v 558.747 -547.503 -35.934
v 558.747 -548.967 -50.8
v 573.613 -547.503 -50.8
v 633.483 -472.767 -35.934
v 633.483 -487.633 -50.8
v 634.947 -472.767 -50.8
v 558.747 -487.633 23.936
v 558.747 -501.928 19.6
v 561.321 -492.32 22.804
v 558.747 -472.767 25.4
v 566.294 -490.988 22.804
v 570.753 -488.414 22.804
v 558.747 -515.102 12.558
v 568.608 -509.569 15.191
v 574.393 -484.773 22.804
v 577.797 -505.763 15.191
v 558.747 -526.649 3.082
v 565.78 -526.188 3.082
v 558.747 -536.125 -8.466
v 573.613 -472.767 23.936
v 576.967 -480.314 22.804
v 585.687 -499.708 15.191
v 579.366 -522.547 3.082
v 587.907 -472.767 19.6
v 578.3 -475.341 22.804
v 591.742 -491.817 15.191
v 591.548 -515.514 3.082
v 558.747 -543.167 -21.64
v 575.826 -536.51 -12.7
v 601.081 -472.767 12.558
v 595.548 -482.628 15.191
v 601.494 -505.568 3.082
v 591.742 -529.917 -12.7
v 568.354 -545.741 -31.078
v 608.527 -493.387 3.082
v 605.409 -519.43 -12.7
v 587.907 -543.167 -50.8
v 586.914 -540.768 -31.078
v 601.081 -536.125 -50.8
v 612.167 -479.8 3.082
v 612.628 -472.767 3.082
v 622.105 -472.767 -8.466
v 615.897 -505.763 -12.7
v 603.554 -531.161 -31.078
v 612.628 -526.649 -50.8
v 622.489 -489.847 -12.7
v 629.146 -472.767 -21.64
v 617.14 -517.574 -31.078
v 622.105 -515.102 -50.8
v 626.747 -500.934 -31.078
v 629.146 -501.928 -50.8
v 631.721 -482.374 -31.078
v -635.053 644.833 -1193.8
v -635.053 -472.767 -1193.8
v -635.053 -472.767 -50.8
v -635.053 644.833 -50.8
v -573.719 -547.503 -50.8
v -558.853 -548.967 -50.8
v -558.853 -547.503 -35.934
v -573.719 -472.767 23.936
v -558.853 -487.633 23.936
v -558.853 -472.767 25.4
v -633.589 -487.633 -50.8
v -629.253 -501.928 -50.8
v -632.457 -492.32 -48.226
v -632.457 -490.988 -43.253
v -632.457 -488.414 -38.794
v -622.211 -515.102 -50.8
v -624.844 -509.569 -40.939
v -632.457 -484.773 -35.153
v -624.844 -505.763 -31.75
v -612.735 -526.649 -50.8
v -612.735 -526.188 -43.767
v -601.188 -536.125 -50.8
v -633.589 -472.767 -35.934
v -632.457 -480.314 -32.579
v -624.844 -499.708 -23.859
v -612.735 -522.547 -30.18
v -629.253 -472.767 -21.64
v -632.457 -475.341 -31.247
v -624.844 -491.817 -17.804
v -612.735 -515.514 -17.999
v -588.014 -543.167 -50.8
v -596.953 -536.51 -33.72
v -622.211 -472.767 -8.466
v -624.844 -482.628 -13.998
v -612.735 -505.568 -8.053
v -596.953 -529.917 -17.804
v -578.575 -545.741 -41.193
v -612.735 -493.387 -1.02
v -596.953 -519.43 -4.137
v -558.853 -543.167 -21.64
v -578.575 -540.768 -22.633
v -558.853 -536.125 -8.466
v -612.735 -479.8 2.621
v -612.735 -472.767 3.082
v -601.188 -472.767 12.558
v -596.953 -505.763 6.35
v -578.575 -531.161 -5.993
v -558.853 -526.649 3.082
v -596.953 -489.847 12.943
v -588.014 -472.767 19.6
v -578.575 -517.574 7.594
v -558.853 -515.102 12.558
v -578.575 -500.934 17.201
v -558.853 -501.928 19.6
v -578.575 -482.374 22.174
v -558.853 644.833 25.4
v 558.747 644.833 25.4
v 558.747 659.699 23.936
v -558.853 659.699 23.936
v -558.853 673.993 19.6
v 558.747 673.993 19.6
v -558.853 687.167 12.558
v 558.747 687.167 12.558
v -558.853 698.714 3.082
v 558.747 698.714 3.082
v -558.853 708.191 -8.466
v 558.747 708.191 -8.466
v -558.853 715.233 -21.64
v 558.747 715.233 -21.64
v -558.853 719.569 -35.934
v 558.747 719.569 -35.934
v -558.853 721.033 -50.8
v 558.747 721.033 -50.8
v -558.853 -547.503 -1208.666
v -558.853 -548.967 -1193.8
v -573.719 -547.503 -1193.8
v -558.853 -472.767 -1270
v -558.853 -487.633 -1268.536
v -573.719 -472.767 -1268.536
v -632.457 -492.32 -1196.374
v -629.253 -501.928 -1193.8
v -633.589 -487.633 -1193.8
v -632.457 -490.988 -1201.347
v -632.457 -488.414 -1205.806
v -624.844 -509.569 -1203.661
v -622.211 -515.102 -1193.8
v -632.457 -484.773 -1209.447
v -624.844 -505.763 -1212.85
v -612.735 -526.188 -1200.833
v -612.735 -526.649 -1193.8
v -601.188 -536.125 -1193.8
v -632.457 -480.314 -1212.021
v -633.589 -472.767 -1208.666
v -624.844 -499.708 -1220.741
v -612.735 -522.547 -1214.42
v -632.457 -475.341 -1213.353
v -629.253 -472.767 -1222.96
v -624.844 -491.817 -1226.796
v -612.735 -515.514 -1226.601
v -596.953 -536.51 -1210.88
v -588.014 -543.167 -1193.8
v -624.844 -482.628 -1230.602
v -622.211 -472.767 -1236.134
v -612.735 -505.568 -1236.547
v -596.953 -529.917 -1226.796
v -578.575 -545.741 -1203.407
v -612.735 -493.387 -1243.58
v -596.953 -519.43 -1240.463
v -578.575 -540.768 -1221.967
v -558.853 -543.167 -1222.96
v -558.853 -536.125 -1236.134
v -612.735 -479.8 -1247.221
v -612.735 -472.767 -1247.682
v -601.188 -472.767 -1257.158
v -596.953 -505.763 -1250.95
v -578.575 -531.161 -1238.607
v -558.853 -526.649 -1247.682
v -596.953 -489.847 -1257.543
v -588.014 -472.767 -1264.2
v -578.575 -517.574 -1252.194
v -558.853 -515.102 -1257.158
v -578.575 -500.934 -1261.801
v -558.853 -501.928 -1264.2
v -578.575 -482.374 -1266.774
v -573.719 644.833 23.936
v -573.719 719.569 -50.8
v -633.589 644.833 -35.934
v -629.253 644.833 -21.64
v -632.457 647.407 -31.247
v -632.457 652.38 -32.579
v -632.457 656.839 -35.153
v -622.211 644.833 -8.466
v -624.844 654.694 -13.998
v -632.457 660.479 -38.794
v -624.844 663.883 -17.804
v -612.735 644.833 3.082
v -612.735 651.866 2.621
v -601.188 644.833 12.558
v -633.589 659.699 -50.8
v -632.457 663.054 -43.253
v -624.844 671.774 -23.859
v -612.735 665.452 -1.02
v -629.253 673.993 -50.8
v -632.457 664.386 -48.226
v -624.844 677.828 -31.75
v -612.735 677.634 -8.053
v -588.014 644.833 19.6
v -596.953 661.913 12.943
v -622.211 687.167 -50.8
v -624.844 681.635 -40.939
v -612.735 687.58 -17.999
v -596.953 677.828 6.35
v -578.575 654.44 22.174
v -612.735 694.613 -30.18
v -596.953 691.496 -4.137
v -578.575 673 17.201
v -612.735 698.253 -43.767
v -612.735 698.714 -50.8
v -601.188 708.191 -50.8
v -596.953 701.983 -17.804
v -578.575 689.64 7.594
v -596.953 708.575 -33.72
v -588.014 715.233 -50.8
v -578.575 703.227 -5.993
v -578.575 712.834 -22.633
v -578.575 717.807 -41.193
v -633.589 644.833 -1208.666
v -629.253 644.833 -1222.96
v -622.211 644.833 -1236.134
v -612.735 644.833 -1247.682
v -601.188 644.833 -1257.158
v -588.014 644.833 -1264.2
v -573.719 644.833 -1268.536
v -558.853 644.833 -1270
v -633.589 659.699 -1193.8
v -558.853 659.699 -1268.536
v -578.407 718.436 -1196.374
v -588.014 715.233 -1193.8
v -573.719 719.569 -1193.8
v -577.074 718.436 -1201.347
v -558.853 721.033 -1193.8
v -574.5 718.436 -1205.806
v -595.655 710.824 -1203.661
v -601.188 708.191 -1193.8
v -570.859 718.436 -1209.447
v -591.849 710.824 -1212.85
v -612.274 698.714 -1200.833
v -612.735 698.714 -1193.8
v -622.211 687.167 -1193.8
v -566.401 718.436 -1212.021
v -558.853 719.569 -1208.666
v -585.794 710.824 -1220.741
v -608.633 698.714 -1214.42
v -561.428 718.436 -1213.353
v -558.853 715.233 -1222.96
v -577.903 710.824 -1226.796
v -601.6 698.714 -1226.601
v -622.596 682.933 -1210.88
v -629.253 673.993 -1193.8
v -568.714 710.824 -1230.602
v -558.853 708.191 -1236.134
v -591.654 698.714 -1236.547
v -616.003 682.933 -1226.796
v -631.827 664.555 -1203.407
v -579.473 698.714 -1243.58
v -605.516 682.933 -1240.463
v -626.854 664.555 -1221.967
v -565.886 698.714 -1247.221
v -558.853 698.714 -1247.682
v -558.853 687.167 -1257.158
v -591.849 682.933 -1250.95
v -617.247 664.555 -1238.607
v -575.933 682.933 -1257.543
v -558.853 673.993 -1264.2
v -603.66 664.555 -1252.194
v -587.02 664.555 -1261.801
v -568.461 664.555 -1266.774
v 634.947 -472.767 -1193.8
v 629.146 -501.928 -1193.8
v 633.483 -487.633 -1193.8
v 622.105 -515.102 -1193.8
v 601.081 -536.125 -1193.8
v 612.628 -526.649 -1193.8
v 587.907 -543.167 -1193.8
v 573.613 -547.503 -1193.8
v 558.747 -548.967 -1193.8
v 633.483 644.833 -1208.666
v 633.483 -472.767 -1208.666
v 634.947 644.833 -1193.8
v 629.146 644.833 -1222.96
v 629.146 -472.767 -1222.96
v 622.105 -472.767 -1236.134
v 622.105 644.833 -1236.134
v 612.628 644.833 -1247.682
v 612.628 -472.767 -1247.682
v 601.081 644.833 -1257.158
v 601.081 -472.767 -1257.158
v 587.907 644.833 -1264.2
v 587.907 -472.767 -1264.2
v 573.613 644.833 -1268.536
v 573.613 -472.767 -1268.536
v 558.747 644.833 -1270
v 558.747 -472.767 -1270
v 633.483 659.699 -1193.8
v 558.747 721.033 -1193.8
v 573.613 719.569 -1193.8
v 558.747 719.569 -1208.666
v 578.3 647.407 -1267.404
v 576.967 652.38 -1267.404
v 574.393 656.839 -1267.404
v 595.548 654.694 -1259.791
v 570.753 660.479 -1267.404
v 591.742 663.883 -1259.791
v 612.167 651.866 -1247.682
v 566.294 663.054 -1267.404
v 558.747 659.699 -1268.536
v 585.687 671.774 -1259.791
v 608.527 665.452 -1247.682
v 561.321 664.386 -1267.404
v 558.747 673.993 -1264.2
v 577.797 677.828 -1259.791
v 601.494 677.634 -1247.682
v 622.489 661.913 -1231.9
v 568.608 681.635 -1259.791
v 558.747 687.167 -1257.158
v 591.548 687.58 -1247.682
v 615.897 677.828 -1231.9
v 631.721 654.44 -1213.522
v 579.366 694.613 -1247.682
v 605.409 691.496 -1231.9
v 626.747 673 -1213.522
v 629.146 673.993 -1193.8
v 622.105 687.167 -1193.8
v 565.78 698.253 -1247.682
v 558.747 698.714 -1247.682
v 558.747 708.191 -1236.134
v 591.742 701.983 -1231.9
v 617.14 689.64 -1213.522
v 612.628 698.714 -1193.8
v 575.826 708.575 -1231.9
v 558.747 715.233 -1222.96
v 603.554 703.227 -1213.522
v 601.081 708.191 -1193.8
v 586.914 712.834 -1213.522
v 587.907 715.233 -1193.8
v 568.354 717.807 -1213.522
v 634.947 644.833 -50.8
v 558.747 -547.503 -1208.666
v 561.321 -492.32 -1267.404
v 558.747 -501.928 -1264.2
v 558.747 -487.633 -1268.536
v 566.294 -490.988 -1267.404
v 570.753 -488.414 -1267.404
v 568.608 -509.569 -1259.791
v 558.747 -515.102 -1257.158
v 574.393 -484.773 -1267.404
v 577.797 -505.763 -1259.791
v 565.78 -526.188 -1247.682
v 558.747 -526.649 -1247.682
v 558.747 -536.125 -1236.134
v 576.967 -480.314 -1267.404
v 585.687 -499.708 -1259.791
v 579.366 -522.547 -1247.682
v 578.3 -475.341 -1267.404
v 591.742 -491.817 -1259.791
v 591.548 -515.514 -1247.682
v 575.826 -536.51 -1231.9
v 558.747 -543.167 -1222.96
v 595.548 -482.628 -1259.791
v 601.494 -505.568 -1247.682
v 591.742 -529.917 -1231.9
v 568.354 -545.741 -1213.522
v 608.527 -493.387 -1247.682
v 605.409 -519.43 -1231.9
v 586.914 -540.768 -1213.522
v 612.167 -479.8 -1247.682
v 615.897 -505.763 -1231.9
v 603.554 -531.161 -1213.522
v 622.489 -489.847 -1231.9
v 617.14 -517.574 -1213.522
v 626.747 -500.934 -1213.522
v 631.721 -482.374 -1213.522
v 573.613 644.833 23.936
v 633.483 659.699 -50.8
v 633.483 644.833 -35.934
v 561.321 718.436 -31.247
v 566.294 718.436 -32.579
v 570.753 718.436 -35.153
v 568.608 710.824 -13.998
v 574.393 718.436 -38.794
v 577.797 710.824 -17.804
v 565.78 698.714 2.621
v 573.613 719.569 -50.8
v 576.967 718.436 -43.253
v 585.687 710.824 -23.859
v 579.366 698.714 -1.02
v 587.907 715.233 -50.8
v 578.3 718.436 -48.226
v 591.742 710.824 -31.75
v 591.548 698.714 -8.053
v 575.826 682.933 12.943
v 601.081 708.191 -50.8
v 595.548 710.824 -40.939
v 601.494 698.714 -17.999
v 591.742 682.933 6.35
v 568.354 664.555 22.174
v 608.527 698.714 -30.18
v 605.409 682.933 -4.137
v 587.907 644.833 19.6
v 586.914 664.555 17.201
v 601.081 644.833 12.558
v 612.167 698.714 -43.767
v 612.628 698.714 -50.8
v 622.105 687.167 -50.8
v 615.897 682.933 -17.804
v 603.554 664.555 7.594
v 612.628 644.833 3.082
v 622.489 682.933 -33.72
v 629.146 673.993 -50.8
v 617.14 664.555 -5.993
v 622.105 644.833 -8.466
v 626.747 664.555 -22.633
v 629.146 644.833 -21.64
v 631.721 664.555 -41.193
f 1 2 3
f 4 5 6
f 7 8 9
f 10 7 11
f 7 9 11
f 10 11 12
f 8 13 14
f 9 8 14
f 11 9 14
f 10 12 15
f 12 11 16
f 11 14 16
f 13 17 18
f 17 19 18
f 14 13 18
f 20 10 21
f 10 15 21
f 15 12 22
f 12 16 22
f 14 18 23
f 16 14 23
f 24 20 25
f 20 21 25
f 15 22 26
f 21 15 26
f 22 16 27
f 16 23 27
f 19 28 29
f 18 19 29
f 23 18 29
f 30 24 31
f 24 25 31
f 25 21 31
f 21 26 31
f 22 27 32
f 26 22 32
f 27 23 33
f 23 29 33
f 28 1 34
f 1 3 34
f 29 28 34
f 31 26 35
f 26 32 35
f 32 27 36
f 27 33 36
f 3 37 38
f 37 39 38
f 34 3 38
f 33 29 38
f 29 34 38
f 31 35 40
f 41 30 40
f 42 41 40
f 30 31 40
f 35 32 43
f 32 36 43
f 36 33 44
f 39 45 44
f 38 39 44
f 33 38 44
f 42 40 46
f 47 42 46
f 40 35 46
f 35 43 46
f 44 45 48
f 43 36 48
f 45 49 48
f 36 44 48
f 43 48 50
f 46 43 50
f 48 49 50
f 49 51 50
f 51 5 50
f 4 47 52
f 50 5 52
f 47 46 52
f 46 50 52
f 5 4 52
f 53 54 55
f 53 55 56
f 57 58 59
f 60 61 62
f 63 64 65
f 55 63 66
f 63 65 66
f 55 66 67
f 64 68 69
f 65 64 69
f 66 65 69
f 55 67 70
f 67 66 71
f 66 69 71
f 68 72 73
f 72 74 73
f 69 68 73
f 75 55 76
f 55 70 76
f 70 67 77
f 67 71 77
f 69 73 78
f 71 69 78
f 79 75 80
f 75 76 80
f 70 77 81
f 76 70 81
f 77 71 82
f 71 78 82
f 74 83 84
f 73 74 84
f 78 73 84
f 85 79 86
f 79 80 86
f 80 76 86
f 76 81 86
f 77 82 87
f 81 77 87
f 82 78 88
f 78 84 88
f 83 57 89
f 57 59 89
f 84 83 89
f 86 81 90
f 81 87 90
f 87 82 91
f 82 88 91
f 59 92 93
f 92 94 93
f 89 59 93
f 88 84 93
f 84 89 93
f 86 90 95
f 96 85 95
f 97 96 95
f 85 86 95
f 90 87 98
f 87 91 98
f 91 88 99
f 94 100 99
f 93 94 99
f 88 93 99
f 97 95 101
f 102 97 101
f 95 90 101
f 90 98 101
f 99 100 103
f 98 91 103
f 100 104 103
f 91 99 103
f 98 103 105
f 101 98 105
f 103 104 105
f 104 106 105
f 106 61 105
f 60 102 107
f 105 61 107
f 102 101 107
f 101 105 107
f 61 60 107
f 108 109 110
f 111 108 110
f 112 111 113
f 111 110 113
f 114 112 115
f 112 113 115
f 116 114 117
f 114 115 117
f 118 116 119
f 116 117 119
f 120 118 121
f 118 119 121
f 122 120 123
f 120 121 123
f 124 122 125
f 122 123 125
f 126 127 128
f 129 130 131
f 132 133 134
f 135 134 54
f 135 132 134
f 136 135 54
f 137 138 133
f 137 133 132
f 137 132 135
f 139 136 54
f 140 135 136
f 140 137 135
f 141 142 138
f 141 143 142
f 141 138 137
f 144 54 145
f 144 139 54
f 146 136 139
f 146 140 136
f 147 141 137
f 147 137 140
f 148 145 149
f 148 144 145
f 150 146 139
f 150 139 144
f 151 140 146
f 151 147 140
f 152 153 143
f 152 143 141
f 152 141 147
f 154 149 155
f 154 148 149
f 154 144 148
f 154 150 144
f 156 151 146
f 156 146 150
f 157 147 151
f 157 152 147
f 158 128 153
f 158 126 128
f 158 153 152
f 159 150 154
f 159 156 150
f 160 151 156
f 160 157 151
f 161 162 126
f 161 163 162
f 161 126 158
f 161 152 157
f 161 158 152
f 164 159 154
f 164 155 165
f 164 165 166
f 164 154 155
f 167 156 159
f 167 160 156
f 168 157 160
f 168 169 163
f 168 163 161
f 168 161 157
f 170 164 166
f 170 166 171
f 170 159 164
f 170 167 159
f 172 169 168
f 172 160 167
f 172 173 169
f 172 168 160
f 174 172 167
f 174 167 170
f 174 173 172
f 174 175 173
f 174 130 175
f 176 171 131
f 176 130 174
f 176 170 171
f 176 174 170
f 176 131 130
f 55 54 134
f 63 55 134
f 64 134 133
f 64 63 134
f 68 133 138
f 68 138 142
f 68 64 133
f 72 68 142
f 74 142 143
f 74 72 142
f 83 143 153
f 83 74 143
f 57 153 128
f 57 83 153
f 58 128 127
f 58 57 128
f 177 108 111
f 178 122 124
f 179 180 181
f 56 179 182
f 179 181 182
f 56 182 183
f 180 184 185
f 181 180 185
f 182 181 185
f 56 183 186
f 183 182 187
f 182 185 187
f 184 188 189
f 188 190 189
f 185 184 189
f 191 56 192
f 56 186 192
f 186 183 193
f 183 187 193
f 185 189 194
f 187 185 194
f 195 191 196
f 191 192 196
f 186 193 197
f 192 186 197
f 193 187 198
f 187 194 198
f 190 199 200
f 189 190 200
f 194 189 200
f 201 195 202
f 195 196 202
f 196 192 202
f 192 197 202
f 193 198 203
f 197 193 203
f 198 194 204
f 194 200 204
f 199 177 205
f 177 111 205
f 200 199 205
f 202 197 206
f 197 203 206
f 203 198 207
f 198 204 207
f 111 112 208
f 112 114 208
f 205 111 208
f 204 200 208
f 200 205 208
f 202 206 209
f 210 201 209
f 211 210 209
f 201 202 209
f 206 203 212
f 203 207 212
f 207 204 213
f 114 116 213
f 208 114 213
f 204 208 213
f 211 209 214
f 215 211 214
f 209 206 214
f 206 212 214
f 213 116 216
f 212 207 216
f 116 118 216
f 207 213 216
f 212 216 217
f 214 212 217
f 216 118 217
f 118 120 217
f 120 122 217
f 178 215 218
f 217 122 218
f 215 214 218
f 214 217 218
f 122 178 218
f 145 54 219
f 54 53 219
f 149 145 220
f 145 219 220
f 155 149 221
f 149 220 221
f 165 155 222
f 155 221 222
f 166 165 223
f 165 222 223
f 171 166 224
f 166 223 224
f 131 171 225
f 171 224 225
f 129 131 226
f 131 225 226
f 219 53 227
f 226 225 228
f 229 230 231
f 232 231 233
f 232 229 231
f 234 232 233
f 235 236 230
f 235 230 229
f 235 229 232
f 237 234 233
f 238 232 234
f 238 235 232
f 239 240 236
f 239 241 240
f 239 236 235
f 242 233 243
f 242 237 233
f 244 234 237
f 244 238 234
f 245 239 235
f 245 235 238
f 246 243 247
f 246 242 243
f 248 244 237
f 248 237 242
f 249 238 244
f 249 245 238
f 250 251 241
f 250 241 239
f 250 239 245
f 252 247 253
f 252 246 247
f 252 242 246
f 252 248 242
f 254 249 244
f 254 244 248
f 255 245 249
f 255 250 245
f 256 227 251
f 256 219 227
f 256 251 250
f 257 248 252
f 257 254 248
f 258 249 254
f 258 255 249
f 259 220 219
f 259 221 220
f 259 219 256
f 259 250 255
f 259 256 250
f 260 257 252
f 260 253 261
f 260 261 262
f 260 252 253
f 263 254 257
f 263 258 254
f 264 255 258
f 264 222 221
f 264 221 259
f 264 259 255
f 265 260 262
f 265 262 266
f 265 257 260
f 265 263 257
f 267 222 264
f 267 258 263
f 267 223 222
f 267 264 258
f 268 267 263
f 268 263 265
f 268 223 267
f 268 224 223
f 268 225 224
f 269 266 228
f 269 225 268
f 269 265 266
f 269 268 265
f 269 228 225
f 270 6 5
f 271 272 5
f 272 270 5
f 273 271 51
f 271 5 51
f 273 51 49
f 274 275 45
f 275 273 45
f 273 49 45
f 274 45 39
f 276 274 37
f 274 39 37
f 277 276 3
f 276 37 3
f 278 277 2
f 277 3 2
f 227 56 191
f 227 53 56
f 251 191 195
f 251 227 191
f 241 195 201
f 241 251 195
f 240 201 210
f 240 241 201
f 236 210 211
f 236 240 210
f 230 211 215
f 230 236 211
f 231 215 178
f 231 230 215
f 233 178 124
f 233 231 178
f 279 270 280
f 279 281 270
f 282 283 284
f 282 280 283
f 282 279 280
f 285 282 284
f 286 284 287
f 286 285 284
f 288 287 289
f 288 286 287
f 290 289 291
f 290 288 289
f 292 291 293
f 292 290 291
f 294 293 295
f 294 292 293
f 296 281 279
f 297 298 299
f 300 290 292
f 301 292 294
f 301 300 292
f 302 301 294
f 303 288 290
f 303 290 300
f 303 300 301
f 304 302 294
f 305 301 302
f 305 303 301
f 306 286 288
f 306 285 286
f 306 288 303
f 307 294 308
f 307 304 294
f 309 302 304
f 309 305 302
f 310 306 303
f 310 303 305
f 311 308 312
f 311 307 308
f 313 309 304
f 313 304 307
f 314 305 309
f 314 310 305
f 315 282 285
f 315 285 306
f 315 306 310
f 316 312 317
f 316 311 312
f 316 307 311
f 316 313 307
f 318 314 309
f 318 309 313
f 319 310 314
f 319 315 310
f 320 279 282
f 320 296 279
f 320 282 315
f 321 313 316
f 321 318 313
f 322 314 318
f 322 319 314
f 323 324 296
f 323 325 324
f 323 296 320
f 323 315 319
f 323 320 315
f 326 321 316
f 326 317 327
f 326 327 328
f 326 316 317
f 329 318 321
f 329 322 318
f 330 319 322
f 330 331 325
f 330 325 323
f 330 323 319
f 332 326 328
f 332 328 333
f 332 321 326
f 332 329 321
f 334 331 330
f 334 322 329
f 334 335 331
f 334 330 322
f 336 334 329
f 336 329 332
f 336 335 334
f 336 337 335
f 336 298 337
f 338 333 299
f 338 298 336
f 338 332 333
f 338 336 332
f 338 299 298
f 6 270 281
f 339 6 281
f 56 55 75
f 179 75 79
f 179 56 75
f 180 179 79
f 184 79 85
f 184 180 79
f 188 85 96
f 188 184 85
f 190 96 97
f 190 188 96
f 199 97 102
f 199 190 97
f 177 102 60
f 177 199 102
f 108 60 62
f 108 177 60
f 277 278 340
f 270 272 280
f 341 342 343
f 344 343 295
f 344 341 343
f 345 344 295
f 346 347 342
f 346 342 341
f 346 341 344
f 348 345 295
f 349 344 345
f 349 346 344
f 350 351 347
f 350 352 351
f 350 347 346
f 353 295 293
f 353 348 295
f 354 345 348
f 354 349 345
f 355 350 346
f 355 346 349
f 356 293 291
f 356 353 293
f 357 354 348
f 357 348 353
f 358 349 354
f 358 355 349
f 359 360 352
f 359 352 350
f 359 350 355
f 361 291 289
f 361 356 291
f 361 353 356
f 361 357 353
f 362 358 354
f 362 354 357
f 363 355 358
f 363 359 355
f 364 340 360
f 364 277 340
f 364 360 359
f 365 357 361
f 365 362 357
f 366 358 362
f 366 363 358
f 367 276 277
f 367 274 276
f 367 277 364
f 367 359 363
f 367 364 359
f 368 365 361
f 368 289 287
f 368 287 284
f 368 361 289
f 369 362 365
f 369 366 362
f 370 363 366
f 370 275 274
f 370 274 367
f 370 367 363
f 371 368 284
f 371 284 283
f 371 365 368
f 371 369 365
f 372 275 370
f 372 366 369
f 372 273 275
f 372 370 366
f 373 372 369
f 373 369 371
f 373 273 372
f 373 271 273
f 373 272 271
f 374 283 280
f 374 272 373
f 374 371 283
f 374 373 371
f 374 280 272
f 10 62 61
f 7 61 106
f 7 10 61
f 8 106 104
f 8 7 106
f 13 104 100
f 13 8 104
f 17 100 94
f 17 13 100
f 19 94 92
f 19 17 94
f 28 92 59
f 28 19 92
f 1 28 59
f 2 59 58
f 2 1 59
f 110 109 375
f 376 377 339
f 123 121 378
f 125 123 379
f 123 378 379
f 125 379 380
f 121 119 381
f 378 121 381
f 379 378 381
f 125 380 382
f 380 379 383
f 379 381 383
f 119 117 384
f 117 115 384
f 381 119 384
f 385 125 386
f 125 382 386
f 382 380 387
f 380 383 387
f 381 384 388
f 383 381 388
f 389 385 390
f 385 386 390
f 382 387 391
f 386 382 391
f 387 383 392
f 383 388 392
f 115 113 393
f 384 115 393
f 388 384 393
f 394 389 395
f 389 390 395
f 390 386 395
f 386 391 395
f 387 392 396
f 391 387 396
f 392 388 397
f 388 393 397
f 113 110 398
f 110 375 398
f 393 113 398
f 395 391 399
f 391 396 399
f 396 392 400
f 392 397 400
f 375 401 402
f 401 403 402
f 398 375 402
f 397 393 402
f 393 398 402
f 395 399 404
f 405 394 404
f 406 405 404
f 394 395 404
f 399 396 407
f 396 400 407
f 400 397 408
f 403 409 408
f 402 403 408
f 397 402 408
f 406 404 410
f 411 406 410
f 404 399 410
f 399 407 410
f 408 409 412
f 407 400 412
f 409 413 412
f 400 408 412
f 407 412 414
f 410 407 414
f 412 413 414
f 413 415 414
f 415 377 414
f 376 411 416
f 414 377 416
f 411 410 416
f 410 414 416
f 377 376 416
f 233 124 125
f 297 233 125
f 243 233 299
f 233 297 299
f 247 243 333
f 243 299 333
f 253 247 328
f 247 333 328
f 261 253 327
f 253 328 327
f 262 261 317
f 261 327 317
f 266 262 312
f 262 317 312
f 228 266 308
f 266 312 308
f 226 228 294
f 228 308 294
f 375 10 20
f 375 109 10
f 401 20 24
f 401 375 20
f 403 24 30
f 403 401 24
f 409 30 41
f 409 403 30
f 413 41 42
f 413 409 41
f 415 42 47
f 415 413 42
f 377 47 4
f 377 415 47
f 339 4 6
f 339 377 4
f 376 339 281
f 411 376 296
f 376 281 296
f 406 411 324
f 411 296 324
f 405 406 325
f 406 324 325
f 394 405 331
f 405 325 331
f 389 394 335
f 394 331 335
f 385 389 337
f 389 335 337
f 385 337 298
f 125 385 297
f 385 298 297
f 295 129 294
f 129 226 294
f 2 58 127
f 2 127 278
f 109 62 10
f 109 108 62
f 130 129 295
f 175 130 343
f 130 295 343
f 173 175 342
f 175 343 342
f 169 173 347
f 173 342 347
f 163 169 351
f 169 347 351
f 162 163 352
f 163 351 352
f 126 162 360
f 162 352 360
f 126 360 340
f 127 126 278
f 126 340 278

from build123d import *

# Parameters (mm, degrees)
F0_W     = 1270
F0_H     = 1270
F1_DEPTH = 25.4
F2_DEPTH = 1270
F3_R     = 76.2


with BuildPart() as f1:
    # F0 (on Top) → F1 (new body)
    with BuildSketch(Plane.XY):
        with Locations((-0.053324, 86.032909)):
            Rectangle(F0_W, F0_H)
    extrude(amount=F1_DEPTH)

    # F0 (on Top) → F2 (join)
    with BuildSketch(Plane.XY):
        with Locations((-0.053324, 86.032909)):
            Rectangle(F0_W, F0_H)
    extrude(amount=-F2_DEPTH)

    # F3
    f3_edges = [f1.edges().sort_by_distance(p)[0] for p in [
        (634.946676, -548.967091, -622.3),
        (-0.053324, -548.967091, -1270),
        (-0.053324, -548.967091, 25.4),
        (-635.053324, -548.967091, -622.3),
        (634.946676, 86.032909, 25.4),
        (-0.053324, 721.032909, 25.4),
        (634.946676, 721.032909, -622.3),
        (634.946676, 86.032909, -1270),
        (-635.053324, 86.032909, 25.4),
        (-635.053324, 86.032909, -1270),
        (-635.053324, 721.032909, -622.3),
        (-0.053324, 721.032909, -1270),
    ]]
    fillet(f3_edges, radius=F3_R)


solid = f1.part
